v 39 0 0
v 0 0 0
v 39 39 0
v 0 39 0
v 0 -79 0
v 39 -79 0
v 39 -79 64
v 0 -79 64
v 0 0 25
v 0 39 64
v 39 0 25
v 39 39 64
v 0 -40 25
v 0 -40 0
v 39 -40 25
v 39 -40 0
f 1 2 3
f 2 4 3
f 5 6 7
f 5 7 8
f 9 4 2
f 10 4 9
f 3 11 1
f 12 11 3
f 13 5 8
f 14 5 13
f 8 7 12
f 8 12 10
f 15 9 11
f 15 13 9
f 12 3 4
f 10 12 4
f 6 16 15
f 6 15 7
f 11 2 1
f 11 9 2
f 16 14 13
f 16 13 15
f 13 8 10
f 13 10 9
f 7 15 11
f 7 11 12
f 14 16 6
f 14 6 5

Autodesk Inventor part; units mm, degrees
ref_plane "YZ Plane" through (0, 0, 0) normal (1, 0, 0) x (0, 1, 0)
ref_plane "XZ Plane" through (0, 0, 0) normal (0, 1, 0) x (-1, 0, 0)
ref_plane "XY Plane" through (0, 0, 0) normal (0, 0, 1) x (1, 0, 0)
sketch "Sketch1" plane through (0, 0, 0) normal (0, 0, 1) x (1, 0, 0)
  line L0 (0, 0) -> (39, 0)
  line L1 (39, 0) -> (39, 39)
  line L2 (39, 39) -> (0, 39)
  line L3 (0, 39) -> (0, 0)
  dimension "d0" = 39
  dimension "d1" = 39
sketch "Sketch2" plane through (0, 0, 0) normal (1, 0, 0) x (0, 1, 0)
  line L0 (0, 0) -> (0, 25)
  line L1 (0, 25) -> (-40, 25)
  line L2 (-40, 25) -> (-40, 0)
  dimension "d2" = 25
  dimension "d3" = 40
sweep "Sweep1" add profiles "Sketch1" path "Sketch2"
properties part number "motor support"
